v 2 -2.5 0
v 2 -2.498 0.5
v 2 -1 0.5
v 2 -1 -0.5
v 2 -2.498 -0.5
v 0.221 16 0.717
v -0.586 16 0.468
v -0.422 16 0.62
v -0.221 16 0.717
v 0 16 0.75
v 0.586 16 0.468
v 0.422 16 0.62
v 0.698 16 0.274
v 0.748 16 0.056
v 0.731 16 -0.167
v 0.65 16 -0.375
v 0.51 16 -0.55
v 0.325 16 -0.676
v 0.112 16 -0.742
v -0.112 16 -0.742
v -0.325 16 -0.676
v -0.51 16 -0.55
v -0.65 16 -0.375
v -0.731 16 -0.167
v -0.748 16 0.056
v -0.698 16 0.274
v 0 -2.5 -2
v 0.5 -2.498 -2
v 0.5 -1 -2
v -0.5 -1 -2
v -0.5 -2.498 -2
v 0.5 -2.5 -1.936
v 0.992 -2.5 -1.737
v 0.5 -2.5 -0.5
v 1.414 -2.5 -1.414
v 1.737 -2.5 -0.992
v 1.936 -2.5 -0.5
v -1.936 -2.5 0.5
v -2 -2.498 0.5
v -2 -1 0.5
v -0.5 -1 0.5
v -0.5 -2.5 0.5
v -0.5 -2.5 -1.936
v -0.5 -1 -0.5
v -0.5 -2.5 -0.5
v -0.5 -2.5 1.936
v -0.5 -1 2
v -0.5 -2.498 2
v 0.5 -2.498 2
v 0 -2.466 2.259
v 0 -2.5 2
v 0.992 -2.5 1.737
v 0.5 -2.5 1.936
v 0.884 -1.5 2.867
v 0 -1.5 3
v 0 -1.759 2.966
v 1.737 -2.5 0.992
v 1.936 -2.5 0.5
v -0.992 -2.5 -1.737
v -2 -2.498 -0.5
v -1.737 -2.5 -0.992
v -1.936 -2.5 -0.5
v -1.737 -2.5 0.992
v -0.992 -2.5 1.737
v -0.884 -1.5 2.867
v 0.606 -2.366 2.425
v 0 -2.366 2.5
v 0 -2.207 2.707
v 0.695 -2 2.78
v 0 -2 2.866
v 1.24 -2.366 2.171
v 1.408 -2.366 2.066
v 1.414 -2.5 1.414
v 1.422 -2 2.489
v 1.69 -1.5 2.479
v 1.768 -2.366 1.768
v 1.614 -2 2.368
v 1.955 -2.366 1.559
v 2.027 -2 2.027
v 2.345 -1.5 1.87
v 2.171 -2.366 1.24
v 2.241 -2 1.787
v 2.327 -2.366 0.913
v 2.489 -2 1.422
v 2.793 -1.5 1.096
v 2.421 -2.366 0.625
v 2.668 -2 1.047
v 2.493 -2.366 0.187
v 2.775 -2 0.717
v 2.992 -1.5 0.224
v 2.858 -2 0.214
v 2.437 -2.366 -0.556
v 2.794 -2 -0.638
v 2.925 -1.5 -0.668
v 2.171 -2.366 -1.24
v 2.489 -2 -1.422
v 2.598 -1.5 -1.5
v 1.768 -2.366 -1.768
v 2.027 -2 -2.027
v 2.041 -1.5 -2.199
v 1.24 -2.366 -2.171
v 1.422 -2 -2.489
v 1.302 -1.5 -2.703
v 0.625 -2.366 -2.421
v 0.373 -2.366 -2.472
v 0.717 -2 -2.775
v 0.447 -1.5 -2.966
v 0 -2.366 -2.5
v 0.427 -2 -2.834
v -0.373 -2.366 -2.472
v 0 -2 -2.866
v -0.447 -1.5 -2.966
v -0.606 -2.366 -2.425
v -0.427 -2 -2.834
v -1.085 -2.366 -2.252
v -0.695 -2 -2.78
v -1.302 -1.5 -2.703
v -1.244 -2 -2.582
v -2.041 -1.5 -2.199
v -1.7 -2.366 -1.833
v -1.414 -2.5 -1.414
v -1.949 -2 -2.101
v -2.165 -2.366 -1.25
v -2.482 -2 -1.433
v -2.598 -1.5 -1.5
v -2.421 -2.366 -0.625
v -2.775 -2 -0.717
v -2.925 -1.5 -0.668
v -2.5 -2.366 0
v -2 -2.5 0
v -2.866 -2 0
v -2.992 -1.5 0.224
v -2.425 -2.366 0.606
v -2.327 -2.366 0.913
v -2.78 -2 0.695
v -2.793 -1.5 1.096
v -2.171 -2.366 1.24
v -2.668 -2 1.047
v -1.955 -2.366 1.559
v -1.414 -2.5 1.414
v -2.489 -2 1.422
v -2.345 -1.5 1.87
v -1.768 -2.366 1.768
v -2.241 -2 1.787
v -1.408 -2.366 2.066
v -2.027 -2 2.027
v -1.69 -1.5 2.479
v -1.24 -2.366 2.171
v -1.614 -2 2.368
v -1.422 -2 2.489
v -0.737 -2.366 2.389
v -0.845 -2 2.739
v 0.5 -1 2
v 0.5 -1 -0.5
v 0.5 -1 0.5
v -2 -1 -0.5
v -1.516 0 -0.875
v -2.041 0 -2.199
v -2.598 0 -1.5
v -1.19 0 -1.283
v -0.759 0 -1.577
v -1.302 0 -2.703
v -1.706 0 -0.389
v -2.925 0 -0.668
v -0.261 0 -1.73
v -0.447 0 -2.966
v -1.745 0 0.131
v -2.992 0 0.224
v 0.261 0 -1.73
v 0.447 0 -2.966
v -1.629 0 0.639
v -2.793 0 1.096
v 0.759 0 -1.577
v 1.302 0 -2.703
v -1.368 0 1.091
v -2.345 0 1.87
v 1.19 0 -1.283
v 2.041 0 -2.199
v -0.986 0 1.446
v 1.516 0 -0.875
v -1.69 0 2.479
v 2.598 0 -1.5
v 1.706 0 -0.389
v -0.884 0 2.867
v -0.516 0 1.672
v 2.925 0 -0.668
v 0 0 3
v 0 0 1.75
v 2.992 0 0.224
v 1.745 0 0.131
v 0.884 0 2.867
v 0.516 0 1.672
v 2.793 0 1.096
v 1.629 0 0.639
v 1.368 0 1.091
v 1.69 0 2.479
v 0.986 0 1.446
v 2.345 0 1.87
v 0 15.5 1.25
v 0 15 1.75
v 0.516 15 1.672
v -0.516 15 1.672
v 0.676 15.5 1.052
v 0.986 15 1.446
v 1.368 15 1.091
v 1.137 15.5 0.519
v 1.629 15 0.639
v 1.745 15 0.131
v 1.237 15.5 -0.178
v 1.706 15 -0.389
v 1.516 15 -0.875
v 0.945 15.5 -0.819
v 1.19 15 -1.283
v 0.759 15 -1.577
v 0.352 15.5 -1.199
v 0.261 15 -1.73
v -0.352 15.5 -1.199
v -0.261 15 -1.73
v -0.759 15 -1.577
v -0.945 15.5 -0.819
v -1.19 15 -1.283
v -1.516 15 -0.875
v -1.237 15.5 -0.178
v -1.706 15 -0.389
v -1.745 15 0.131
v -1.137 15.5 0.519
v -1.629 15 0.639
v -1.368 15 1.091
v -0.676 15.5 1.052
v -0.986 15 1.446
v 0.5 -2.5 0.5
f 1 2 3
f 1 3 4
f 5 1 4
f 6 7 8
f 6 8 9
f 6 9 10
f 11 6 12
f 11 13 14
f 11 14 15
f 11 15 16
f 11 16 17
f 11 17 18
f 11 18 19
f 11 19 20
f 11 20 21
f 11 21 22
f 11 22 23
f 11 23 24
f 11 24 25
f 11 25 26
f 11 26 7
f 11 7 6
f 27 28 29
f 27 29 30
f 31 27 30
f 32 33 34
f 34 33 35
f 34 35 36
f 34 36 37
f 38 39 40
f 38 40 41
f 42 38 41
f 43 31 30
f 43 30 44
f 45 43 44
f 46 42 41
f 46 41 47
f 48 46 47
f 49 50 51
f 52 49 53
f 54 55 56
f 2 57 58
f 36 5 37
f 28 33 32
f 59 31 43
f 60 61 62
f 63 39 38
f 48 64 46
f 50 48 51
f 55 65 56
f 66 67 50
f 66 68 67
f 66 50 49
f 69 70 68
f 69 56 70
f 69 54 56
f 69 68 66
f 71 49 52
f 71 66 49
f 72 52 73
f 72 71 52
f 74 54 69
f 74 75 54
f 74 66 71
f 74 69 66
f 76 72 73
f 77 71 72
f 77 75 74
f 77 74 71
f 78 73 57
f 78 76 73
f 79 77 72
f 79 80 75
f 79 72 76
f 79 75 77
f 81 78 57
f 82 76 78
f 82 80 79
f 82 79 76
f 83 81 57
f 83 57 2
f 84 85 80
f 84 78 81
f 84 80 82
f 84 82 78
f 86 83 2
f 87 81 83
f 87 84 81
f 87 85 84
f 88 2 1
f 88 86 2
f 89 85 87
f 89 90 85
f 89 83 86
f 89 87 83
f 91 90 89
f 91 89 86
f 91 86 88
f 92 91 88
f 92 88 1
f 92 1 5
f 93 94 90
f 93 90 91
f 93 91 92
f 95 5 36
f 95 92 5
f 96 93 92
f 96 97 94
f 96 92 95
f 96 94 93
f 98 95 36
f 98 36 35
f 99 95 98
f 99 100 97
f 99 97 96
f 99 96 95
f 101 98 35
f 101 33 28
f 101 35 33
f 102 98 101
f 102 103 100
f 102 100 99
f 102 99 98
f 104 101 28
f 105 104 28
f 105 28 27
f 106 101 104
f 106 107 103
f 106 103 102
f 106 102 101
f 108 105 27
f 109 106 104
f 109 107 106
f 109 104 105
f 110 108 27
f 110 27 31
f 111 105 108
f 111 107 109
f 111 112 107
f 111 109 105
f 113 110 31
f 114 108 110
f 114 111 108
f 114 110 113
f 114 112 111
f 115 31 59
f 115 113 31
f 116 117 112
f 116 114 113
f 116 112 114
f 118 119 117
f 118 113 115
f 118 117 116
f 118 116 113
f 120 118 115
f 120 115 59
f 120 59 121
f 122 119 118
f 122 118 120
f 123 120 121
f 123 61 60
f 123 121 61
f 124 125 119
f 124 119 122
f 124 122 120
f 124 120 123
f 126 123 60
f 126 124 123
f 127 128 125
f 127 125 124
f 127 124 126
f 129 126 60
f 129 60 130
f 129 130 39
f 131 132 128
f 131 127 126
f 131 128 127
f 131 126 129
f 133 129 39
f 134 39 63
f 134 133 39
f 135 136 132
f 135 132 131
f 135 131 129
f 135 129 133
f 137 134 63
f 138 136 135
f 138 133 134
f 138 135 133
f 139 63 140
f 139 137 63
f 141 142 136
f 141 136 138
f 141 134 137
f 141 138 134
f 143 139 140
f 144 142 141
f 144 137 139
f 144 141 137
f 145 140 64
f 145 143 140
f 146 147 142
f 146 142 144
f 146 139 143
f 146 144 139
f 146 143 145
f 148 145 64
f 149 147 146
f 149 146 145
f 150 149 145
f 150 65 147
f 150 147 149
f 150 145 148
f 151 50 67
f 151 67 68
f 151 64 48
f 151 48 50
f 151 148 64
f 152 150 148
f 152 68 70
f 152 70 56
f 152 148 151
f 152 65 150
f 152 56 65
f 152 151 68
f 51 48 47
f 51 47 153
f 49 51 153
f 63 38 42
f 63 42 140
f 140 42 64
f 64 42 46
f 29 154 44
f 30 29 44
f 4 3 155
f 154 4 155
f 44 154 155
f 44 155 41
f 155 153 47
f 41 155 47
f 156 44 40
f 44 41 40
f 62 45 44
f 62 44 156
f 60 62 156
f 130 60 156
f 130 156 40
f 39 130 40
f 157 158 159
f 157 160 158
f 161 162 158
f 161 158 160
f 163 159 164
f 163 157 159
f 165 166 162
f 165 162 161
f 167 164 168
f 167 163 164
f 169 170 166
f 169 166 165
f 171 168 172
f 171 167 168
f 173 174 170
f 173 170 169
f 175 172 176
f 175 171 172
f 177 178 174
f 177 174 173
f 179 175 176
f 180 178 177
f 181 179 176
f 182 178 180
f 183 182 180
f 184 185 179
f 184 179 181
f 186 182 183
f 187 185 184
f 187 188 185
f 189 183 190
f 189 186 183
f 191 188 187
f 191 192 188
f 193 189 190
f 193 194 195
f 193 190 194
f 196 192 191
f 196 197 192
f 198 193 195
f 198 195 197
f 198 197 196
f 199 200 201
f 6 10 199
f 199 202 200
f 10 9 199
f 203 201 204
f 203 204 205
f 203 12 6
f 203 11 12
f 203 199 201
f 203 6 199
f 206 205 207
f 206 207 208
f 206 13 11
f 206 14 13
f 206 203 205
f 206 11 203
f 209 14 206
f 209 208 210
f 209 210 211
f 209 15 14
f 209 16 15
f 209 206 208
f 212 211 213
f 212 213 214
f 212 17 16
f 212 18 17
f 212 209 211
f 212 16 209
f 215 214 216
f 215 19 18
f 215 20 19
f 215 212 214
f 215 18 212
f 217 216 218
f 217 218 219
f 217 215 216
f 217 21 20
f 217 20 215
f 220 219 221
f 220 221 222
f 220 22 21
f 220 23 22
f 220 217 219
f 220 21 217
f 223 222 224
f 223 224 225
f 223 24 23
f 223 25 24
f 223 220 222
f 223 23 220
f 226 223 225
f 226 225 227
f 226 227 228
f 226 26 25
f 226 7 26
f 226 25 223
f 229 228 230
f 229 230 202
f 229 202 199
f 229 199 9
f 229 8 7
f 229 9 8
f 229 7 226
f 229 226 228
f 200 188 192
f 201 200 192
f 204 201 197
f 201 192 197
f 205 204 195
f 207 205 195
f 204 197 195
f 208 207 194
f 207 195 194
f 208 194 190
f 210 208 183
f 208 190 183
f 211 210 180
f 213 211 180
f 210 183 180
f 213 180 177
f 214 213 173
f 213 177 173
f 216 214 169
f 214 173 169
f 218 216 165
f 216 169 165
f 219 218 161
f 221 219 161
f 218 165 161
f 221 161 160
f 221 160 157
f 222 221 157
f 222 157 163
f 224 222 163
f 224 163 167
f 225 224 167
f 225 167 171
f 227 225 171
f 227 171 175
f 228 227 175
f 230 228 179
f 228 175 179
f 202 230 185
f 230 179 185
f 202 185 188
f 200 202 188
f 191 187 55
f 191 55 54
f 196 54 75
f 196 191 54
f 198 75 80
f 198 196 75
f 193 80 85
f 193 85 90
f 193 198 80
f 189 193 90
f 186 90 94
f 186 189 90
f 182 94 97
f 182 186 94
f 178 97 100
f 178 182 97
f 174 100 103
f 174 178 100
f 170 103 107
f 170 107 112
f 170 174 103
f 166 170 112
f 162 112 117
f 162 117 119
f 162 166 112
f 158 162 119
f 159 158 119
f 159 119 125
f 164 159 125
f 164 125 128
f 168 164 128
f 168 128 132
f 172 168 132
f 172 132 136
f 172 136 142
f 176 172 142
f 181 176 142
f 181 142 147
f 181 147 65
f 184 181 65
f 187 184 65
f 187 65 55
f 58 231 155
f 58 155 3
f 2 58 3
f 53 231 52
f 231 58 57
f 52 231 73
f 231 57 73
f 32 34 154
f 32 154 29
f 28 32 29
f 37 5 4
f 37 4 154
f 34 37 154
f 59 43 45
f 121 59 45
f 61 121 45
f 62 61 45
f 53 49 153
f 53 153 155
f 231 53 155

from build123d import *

# Parameters (mm, degrees)
SKIZZE1_R                       = 1.75
AUFSATZ_LINEAR_AUSTRAGEN1_DEPTH = 16
SKIZZE2_R                       = 3
AUFSATZ_LINEAR_AUSTRAGEN2_DEPTH = 2.5
SCHNITT_LINEAR_AUSTRAGEN1_DEPTH = 1.5
VERRUNDUNG1_R                   = 1
FASE1_SIZE                      = 1


with BuildPart() as part:
    # Skizze1 → Aufsatz-Linear austragen1 (new body)
    with BuildSketch(Plane(origin=(0, 0, 0), x_dir=(1, 0, 0), z_dir=(0, 1, 0))):
        with Locations(Location((0, 0, 0), (0, 0, 270))):
            Circle(SKIZZE1_R)
    extrude(amount=AUFSATZ_LINEAR_AUSTRAGEN1_DEPTH)

    # Skizze2 → Aufsatz-Linear austragen2 (add)
    with BuildSketch(Plane(origin=(0, 0, 0), x_dir=(1, 0, 0), z_dir=(0, 1, 0))):
        with Locations(Location((0, 0, 0), (0, 0, 270))):
            Circle(SKIZZE2_R)
    extrude(amount=-AUFSATZ_LINEAR_AUSTRAGEN2_DEPTH)

    # Skizze3 → Schnitt-Linear austragen1 (cut)
    with BuildSketch(Plane.XZ.offset(2.5)):
        Polygon((-0.5, 2), (0.5, 2), (0.5, 0.5), (2, 0.5), (2, -0.5), (0.5, -0.5), (0.5, -2), (-0.5, -2), (-0.5, -0.5), (-2, -0.5), (-2, 0.5), (-0.5, 0.5), align=None)
    extrude(amount=-SCHNITT_LINEAR_AUSTRAGEN1_DEPTH, mode=Mode.SUBTRACT)

    # Verrundung1
    # the kernel refuses this fillet: 1 mm, written as the material it takes off along each edge
    with BuildSketch(Plane(origin=(0, -2.5, 0), x_dir=(0, 0, 1), z_dir=(-1, 0, 0))) as verrundung1_piece_1:
        with BuildLine():
            CenterArc((3 - VERRUNDUNG1_R, VERRUNDUNG1_R), VERRUNDUNG1_R, 270, 90)
            Line((3 - VERRUNDUNG1_R, 0), (3, 0))
            Line((3, 0), (3, VERRUNDUNG1_R))
        make_face()
    revolve(axis=Axis((0, -2.5, 0), (0, 1, 0)), mode=Mode.SUBTRACT)

    # Fase1
    fase1_edges = [part.edges().sort_by_distance(p)[0] for p in [
        (0, 16, -1.75),
    ]]
    chamfer(fase1_edges, length=FASE1_SIZE)


solid = part.part
